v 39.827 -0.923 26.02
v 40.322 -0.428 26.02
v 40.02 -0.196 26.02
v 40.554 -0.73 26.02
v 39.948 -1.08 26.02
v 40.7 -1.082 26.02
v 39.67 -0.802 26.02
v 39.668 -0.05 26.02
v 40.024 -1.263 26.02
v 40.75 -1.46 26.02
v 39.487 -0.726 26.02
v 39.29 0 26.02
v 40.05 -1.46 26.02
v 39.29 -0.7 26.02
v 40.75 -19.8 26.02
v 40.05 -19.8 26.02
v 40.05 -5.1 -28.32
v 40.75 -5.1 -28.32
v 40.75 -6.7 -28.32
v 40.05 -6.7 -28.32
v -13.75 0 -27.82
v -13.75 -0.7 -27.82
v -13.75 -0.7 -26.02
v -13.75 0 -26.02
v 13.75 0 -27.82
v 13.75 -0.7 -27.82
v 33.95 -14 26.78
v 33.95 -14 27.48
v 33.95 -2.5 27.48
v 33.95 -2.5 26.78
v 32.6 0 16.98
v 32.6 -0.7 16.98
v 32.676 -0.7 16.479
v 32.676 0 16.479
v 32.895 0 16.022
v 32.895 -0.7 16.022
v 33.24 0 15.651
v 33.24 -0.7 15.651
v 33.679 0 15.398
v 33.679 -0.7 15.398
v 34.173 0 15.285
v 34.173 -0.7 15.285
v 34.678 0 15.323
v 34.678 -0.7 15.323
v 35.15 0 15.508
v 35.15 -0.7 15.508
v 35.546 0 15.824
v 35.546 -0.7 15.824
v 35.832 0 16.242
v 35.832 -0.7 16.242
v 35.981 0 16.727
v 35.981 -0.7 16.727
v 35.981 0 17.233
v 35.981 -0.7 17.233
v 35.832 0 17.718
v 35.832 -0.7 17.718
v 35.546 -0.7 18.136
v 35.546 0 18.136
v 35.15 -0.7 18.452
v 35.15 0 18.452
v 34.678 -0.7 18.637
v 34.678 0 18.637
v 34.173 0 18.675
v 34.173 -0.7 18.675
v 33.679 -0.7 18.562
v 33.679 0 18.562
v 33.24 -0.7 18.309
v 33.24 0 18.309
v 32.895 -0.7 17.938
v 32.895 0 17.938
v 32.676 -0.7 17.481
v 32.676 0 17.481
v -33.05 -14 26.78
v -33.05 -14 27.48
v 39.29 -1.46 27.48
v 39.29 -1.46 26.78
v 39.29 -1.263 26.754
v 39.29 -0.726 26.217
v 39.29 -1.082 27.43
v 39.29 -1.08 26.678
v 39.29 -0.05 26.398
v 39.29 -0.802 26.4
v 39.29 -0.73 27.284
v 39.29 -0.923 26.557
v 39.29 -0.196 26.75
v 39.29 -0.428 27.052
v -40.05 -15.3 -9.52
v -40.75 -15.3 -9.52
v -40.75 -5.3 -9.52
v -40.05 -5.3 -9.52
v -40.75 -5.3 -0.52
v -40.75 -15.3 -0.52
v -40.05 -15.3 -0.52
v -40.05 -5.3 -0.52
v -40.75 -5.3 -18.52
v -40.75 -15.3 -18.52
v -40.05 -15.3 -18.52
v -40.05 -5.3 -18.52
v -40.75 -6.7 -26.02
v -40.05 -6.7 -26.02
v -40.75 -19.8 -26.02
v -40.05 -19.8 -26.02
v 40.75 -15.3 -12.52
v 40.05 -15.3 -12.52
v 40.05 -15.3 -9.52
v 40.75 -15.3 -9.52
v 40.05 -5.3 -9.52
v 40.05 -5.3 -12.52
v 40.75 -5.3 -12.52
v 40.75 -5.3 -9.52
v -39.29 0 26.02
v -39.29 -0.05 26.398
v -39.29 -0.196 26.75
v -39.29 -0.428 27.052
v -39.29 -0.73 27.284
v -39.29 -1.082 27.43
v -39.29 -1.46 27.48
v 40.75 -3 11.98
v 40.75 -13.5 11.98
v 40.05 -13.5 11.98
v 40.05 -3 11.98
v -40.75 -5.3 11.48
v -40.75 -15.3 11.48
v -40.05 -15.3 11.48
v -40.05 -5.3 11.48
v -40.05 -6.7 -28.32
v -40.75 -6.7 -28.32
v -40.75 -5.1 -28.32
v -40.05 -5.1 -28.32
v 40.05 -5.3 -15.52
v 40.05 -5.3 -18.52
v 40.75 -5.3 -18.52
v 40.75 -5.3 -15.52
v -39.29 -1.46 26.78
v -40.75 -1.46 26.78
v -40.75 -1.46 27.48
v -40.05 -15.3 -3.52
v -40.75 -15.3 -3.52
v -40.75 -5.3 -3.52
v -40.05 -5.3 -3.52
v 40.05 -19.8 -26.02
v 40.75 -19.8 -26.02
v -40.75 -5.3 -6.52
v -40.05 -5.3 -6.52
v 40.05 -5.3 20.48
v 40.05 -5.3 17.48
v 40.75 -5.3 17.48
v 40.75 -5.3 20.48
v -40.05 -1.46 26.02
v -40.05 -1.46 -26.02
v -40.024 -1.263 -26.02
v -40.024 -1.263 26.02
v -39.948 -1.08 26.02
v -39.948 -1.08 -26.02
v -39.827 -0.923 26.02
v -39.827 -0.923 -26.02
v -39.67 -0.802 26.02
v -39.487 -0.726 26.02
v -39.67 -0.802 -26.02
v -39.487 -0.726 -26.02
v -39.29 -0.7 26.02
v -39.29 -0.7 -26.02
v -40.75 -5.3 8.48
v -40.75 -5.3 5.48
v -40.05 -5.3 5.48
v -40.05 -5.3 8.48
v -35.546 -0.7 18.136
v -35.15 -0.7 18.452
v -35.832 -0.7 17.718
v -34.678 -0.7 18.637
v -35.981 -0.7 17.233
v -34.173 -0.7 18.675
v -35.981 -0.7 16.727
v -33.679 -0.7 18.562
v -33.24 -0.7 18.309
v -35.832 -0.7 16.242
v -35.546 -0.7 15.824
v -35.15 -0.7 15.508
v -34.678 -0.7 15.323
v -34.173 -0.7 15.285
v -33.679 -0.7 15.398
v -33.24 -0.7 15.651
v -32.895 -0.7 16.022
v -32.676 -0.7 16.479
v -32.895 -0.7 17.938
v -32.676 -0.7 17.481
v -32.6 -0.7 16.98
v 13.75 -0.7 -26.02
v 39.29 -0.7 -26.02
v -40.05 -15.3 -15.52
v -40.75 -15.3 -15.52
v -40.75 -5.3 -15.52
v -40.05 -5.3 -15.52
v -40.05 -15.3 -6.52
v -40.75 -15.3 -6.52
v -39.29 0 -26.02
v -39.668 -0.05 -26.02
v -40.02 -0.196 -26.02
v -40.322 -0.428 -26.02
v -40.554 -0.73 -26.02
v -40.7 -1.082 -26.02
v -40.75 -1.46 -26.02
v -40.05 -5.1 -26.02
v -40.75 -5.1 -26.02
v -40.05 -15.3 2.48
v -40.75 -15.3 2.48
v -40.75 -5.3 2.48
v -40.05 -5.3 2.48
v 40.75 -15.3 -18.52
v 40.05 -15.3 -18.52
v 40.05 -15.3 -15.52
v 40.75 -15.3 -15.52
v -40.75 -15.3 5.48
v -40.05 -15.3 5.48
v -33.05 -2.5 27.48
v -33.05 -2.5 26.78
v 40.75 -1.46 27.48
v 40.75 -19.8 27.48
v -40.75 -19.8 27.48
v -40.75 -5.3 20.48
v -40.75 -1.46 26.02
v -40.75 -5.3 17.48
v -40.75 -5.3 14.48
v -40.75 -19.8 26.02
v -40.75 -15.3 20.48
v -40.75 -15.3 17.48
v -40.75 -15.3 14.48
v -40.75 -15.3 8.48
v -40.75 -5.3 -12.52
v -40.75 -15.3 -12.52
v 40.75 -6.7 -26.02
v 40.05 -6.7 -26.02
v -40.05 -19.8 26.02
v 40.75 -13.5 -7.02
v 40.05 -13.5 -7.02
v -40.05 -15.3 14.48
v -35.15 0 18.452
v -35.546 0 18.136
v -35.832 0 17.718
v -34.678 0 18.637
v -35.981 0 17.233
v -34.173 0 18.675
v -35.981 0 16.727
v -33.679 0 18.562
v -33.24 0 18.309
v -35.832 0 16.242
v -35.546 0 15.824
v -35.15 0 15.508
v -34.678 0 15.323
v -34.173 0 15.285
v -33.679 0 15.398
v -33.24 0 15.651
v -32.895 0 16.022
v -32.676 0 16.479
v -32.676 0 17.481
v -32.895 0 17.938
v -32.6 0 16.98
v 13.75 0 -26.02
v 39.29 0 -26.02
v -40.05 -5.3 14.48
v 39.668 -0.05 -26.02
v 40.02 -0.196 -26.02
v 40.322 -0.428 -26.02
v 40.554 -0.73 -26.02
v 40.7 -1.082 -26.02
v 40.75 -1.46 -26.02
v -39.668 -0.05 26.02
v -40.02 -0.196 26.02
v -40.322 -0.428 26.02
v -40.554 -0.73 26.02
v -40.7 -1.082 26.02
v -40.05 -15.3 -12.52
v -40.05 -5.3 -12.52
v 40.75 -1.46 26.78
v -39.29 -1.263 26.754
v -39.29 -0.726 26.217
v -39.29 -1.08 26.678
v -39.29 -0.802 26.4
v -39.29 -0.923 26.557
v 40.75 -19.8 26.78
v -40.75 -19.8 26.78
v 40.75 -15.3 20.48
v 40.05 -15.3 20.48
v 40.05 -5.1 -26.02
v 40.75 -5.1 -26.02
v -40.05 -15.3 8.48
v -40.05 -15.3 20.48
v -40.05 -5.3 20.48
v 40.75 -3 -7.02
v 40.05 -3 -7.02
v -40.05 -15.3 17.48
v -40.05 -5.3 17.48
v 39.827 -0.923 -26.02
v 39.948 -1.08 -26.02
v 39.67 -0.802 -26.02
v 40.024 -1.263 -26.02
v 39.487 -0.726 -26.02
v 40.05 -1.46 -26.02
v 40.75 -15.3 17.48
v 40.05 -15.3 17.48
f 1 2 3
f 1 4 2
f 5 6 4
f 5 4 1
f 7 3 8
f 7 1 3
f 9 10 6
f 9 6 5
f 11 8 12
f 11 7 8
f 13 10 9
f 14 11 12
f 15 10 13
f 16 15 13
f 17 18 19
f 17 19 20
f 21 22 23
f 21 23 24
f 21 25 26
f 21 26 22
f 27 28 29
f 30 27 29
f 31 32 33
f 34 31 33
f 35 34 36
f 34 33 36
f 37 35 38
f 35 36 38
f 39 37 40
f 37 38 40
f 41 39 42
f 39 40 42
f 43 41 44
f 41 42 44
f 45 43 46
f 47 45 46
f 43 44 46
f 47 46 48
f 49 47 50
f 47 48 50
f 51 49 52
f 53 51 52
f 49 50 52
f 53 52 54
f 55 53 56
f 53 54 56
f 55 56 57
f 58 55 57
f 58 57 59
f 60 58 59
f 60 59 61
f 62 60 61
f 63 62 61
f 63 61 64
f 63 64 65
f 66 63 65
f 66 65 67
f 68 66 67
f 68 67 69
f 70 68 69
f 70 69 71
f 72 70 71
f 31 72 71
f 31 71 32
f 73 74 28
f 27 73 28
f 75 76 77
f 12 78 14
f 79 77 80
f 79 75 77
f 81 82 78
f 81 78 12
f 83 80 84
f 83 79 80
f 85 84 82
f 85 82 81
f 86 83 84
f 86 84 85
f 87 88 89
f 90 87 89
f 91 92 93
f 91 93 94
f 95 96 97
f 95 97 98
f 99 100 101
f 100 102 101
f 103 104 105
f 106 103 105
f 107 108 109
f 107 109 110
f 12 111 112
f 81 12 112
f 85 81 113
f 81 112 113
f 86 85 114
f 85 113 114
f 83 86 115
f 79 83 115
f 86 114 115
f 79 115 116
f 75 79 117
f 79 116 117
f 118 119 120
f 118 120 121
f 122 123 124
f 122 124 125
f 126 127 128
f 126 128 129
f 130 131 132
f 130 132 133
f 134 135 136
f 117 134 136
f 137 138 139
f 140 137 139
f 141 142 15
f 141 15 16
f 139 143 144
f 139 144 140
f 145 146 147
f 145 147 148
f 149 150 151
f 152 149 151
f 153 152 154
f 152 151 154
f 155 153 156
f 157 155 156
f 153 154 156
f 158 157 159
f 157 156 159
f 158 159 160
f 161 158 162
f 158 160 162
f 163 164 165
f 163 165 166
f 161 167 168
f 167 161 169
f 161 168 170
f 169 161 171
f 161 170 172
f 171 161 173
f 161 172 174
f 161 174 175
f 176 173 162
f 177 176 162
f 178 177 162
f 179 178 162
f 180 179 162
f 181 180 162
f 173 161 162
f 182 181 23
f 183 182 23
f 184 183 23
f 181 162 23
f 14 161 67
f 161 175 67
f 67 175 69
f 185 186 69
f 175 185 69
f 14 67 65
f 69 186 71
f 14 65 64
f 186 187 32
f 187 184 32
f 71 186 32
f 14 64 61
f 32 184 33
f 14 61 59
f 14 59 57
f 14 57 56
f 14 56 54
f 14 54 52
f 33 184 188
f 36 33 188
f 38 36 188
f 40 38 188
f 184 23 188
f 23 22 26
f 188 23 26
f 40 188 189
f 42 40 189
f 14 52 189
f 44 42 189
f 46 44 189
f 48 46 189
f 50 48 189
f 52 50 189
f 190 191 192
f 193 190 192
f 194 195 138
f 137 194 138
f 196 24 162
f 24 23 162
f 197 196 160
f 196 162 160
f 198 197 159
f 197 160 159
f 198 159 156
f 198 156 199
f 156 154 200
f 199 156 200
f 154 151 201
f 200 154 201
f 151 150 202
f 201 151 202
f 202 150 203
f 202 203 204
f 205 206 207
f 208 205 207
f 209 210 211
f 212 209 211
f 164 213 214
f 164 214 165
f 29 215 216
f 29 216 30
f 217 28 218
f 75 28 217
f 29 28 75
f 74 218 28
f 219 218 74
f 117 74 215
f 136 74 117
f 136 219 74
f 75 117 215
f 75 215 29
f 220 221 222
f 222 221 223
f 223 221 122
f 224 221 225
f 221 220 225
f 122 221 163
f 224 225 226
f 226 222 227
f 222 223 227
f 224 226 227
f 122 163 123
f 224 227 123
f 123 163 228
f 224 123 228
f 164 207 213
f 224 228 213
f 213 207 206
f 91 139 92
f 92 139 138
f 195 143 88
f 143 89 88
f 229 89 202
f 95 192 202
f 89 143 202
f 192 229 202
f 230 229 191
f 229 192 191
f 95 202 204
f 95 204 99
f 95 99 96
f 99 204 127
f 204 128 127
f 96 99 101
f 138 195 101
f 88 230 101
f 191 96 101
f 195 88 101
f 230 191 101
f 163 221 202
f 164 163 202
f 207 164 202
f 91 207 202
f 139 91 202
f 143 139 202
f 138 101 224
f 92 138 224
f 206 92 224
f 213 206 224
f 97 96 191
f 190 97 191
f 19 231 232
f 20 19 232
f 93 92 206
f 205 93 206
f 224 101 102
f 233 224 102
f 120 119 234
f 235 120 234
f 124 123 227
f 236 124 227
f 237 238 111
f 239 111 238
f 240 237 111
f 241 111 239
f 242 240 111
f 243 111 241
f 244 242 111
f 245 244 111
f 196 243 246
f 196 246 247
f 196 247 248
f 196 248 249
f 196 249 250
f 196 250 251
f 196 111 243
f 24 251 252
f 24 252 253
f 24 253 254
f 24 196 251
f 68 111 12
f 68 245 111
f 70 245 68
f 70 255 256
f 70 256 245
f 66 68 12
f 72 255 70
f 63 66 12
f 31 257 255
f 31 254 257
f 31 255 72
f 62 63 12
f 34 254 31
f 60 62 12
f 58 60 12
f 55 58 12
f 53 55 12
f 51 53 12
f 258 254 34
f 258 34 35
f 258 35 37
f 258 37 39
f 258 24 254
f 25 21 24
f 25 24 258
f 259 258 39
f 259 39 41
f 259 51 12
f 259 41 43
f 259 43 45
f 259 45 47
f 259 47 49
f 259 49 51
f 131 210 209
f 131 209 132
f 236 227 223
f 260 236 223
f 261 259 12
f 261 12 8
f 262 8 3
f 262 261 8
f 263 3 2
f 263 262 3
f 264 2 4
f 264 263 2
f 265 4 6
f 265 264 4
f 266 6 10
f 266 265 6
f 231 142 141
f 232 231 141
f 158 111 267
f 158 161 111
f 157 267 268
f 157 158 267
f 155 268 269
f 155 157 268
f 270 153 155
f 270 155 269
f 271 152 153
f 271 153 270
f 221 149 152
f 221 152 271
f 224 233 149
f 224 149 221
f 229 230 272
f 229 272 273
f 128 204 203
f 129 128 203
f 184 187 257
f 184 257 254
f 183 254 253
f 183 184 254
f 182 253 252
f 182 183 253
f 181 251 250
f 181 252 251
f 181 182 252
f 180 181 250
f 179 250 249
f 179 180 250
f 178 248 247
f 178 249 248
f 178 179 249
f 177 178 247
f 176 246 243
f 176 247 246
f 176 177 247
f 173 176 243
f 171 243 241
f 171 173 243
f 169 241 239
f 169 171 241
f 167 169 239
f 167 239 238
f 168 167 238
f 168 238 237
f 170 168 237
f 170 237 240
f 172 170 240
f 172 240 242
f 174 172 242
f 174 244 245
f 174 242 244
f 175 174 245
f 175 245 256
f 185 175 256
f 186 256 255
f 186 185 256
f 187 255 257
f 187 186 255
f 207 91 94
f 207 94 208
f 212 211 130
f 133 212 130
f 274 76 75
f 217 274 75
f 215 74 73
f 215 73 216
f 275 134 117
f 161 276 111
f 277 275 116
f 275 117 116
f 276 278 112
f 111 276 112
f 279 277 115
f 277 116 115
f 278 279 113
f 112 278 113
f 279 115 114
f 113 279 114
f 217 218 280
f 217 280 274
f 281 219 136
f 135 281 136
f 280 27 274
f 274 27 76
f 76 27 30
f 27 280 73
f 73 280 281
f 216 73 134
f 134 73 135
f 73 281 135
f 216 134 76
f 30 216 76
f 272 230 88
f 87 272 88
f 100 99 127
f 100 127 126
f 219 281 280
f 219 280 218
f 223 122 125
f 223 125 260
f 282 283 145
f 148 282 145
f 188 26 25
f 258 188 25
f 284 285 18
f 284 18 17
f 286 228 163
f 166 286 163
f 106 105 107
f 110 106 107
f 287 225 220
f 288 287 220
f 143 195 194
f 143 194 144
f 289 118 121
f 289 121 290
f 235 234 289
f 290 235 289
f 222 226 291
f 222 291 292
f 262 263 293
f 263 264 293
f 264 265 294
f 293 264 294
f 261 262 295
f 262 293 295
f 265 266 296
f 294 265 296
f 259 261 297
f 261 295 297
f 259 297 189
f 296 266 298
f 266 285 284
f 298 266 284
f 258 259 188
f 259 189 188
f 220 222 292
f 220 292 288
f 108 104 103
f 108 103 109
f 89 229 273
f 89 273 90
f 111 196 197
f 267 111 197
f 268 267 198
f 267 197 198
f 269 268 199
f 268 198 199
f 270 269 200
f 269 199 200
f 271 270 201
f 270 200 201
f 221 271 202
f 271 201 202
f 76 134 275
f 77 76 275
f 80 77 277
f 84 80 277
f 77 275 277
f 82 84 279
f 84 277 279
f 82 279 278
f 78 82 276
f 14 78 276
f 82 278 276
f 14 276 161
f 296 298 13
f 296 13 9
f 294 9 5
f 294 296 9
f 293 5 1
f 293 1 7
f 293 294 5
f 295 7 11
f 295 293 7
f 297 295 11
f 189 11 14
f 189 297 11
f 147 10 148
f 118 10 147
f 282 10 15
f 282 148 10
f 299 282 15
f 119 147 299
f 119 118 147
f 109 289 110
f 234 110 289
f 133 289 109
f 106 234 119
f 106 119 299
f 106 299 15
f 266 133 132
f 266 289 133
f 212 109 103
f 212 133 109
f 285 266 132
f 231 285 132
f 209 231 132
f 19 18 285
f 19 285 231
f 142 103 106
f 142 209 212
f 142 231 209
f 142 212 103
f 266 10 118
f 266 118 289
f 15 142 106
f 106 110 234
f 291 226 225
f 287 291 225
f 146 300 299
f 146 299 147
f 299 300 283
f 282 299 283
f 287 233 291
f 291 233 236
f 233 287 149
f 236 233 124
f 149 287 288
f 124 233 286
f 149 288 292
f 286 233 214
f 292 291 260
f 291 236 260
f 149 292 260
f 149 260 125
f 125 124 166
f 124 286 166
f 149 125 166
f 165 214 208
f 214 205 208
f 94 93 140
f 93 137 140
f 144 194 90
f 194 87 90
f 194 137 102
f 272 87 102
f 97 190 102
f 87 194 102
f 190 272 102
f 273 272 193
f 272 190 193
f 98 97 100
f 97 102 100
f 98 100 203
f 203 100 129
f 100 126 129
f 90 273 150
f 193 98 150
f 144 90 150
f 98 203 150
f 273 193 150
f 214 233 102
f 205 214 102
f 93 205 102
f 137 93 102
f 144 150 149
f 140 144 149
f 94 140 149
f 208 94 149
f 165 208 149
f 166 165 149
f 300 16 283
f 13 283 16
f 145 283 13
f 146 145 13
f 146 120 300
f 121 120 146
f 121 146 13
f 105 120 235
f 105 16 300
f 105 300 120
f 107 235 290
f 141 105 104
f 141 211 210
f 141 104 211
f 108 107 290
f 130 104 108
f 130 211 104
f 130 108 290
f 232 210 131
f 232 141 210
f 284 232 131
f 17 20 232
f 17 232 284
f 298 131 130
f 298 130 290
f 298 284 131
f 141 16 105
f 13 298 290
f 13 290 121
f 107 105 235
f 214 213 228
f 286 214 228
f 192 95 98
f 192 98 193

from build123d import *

# Parameters (mm, degrees)
SKETCH1_W                = 78.58
SKETCH1_H                = 52.04
BOSS_EXTRUDE1_DEPTH      = 0.7
EDGE_FLANGE2_DEPTH       = 52.04
EDGE_FLANGE1_START       = -39.29
EDGE_FLANGE1_DEPTH       = 78.58
EDGE_FLANGE1_START_2     = -40.75
EDGE_FLANGE1_2_OUTLINE_W = 18.34
EDGE_FLANGE1_2_OUTLINE_H = 0.7
EDGE_FLANGE1_2_DEPTH     = 81.5
CUT_EXTRUDE1_REACH       = 90.258
SKETCH12_W               = 3
SKETCH12_H               = 10
LPATTERN1_COUNT          = 7
LPATTERN1_PITCH          = 6
SKETCH13_W               = 3
SKETCH13_H               = 10
CUT_EXTRUDE2_DEPTH       = 88.611816555
CUT_EXTRUDE3_REACH       = 90.258
SKETCH14_W               = 19
SKETCH14_H               = 10.5
SKETCH15_W               = 0.7
SKETCH15_H               = 1.6
BOSS_EXTRUDE2_DEPTH      = 2.3
CUT_EXTRUDE4_REACH       = 73.877
SKETCH16_W               = 67
SKETCH16_H               = 11.5
SKETCH17_W               = 27.5
SKETCH17_H               = 0.7
BOSS_EXTRUDE3_DEPTH      = 1.8
M3_CLEARANCE_HOLE2_D     = 3.4


# Read off the part's stored shape, not the designer's step: Edge-Flange1
# Sheet-metal steps are written as plain solids
with BuildPart() as part:
    # Sketch1 → Boss-Extrude1 (new body)
    with BuildSketch(Plane(origin=(0, 0, 0), x_dir=(1, 0, 0), z_dir=(0, 1, 0))):
        Rectangle(SKETCH1_W, SKETCH1_H)
    extrude(amount=-BOSS_EXTRUDE1_DEPTH)

    # Edge-Flange2 section (across the edge) → Edge-Flange2 (add)
    with BuildSketch(Plane(origin=(40.05, -0.7, -26.02), x_dir=(-1, 0, 0), z_dir=(0, 0, 1))):
        with BuildLine():
            Line((-0.7, 0.76), (-0.7, 19.1))
            Line((-0.7, 19.1), (0, 19.1))
            Line((0, 19.1), (0, 0.76))
            ThreePointArc((0, 0.76), (0.222598846, 0.222598846), (0.76, 0))
            Line((0.76, 0), (0.76, -0.7))
            ThreePointArc((0.76, -0.7), (-0.272375901, -0.272375901), (-0.7, 0.76))
        make_face()
    edge_flange2 = extrude(amount=EDGE_FLANGE2_DEPTH)

    # Mirror1: Edge-Flange2 across plane
    add(edge_flange2.mirror(Plane(origin=(0, 0, 0), x_dir=(0, 0, 1), z_dir=(1, 0, 0))))

    # Edge-Flange1 outline → Edge-Flange1 (add)
    with BuildSketch(Plane.YZ.offset(EDGE_FLANGE1_START)):
        with BuildLine():
            Line((-1.46, 27.48), (-19.8, 27.48))
            Line((-19.8, 27.48), (-19.8, 26.78))
            Line((-19.8, 26.78), (-1.46, 26.78))
            ThreePointArc((-1.46, 26.78), (-0.922598846, 26.557401154), (-0.7, 26.02))
            Line((-0.7, 26.02), (0, 26.02))
            ThreePointArc((0, 26.02), (-0.427624099, 27.052375901), (-1.46, 27.48))
        make_face()
    extrude(amount=EDGE_FLANGE1_DEPTH)

    # Edge-Flange1 2 outline → Edge-Flange1 2 (add)
    with BuildSketch(Plane.YZ.offset(EDGE_FLANGE1_START_2)):
        with Locations((-10.63, 27.13)):
            Rectangle(EDGE_FLANGE1_2_OUTLINE_W, EDGE_FLANGE1_2_OUTLINE_H)
    extrude(amount=EDGE_FLANGE1_2_DEPTH)

    # Sketch12 → Cut-Extrude1 (cut, up to next)
    with BuildSketch(Plane.ZY.offset(40.75), mode=Mode.PRIVATE) as cut_extrude1_sk1:
        with Locations((-17.02, -10.3)):
            Rectangle(SKETCH12_W, SKETCH12_H)
    cut_extrude1_tool1 = extrude(cut_extrude1_sk1.sketch, amount=-CUT_EXTRUDE1_REACH, mode=Mode.PRIVATE) & part.part
    cut_extrude1 = cut_extrude1_tool1.solids().sort_by_distance((-40.75, -10.3, -17.02))[0]
    add(cut_extrude1, mode=Mode.SUBTRACT)

    # LPattern1: Cut-Extrude1 ×7
    with Locations(*[(0, 0, i * LPATTERN1_PITCH) for i in range(1, LPATTERN1_COUNT)]):
        add(cut_extrude1, mode=Mode.SUBTRACT)

    # Sketch13 → Cut-Extrude2 (cut, through all)
    with BuildSketch(Plane.ZY.offset(-40.05)):
        with Locations((18.98, -10.3)):
            Rectangle(SKETCH13_W, SKETCH13_H)
        with Locations((-11.02, -10.3)):
            Rectangle(SKETCH13_W, SKETCH13_H)
        with Locations((-17.02, -10.3)):
            Rectangle(SKETCH13_W, SKETCH13_H)
    extrude(amount=-CUT_EXTRUDE2_DEPTH, mode=Mode.SUBTRACT)

    # Sketch14 → Cut-Extrude3 (cut, up to next)
    with BuildSketch(Plane(origin=(40.75, 0, 0), x_dir=(0, 0, -1), z_dir=(1, 0, 0)), mode=Mode.PRIVATE) as cut_extrude3_sk1:
        with Locations((-2.48, -8.25)):
            Rectangle(SKETCH14_W, SKETCH14_H)
    cut_extrude3_tool1 = extrude(cut_extrude3_sk1.sketch, amount=-CUT_EXTRUDE3_REACH, mode=Mode.PRIVATE) & part.part
    add(cut_extrude3_tool1.solids().sort_by_distance((40.75, -8.25, 2.48))[0], mode=Mode.SUBTRACT)

    # Sketch15 → Boss-Extrude2 (add)
    with BuildSketch(Plane(origin=(0, 0, -26.02), x_dir=(-1, 0, 0), z_dir=(0, 0, -1))):
        with Locations((-40.4, -5.9)):
            Rectangle(SKETCH15_W, SKETCH15_H)
    boss_extrude2 = extrude(amount=BOSS_EXTRUDE2_DEPTH)

    # Mirror2: Boss-Extrude2 across plane
    add(boss_extrude2.mirror(Plane(origin=(0, 0, 0), x_dir=(0, 0, 1), z_dir=(1, 0, 0))))

    # Sketch16 → Cut-Extrude4 (cut, up to next)
    with BuildSketch(Plane.XY.offset(27.48), mode=Mode.PRIVATE) as cut_extrude4_sk1:
        with Locations((0.45, -8.25)):
            Rectangle(SKETCH16_W, SKETCH16_H)
    cut_extrude4_tool1 = extrude(cut_extrude4_sk1.sketch, amount=-CUT_EXTRUDE4_REACH, mode=Mode.PRIVATE) & part.part
    add(cut_extrude4_tool1.solids().sort_by_distance((0.45, -8.25, 27.48))[0], mode=Mode.SUBTRACT)

    # Sketch17 → Boss-Extrude3 (add)
    with BuildSketch(Plane(origin=(0, 0, -26.02), x_dir=(-1, 0, 0), z_dir=(0, 0, -1))):
        with Locations((0, -0.35)):
            Rectangle(SKETCH17_W, SKETCH17_H)
    extrude(amount=BOSS_EXTRUDE3_DEPTH)

    # M3 Clearance Hole2 (through all)
    with Locations(Plane(origin=(0, 0, 0), x_dir=(1, 0, 0), z_dir=(0, 1, 0))):
        with Locations((34.3, -16.98)):
            m3_clearance_hole2 = Hole(M3_CLEARANCE_HOLE2_D / 2)

    # Mirror3: M3 Clearance Hole2 across plane
    add(m3_clearance_hole2.mirror(Plane(origin=(0, 0, 0), x_dir=(0, 0, 1), z_dir=(1, 0, 0))), mode=Mode.SUBTRACT)


solid = part.part
